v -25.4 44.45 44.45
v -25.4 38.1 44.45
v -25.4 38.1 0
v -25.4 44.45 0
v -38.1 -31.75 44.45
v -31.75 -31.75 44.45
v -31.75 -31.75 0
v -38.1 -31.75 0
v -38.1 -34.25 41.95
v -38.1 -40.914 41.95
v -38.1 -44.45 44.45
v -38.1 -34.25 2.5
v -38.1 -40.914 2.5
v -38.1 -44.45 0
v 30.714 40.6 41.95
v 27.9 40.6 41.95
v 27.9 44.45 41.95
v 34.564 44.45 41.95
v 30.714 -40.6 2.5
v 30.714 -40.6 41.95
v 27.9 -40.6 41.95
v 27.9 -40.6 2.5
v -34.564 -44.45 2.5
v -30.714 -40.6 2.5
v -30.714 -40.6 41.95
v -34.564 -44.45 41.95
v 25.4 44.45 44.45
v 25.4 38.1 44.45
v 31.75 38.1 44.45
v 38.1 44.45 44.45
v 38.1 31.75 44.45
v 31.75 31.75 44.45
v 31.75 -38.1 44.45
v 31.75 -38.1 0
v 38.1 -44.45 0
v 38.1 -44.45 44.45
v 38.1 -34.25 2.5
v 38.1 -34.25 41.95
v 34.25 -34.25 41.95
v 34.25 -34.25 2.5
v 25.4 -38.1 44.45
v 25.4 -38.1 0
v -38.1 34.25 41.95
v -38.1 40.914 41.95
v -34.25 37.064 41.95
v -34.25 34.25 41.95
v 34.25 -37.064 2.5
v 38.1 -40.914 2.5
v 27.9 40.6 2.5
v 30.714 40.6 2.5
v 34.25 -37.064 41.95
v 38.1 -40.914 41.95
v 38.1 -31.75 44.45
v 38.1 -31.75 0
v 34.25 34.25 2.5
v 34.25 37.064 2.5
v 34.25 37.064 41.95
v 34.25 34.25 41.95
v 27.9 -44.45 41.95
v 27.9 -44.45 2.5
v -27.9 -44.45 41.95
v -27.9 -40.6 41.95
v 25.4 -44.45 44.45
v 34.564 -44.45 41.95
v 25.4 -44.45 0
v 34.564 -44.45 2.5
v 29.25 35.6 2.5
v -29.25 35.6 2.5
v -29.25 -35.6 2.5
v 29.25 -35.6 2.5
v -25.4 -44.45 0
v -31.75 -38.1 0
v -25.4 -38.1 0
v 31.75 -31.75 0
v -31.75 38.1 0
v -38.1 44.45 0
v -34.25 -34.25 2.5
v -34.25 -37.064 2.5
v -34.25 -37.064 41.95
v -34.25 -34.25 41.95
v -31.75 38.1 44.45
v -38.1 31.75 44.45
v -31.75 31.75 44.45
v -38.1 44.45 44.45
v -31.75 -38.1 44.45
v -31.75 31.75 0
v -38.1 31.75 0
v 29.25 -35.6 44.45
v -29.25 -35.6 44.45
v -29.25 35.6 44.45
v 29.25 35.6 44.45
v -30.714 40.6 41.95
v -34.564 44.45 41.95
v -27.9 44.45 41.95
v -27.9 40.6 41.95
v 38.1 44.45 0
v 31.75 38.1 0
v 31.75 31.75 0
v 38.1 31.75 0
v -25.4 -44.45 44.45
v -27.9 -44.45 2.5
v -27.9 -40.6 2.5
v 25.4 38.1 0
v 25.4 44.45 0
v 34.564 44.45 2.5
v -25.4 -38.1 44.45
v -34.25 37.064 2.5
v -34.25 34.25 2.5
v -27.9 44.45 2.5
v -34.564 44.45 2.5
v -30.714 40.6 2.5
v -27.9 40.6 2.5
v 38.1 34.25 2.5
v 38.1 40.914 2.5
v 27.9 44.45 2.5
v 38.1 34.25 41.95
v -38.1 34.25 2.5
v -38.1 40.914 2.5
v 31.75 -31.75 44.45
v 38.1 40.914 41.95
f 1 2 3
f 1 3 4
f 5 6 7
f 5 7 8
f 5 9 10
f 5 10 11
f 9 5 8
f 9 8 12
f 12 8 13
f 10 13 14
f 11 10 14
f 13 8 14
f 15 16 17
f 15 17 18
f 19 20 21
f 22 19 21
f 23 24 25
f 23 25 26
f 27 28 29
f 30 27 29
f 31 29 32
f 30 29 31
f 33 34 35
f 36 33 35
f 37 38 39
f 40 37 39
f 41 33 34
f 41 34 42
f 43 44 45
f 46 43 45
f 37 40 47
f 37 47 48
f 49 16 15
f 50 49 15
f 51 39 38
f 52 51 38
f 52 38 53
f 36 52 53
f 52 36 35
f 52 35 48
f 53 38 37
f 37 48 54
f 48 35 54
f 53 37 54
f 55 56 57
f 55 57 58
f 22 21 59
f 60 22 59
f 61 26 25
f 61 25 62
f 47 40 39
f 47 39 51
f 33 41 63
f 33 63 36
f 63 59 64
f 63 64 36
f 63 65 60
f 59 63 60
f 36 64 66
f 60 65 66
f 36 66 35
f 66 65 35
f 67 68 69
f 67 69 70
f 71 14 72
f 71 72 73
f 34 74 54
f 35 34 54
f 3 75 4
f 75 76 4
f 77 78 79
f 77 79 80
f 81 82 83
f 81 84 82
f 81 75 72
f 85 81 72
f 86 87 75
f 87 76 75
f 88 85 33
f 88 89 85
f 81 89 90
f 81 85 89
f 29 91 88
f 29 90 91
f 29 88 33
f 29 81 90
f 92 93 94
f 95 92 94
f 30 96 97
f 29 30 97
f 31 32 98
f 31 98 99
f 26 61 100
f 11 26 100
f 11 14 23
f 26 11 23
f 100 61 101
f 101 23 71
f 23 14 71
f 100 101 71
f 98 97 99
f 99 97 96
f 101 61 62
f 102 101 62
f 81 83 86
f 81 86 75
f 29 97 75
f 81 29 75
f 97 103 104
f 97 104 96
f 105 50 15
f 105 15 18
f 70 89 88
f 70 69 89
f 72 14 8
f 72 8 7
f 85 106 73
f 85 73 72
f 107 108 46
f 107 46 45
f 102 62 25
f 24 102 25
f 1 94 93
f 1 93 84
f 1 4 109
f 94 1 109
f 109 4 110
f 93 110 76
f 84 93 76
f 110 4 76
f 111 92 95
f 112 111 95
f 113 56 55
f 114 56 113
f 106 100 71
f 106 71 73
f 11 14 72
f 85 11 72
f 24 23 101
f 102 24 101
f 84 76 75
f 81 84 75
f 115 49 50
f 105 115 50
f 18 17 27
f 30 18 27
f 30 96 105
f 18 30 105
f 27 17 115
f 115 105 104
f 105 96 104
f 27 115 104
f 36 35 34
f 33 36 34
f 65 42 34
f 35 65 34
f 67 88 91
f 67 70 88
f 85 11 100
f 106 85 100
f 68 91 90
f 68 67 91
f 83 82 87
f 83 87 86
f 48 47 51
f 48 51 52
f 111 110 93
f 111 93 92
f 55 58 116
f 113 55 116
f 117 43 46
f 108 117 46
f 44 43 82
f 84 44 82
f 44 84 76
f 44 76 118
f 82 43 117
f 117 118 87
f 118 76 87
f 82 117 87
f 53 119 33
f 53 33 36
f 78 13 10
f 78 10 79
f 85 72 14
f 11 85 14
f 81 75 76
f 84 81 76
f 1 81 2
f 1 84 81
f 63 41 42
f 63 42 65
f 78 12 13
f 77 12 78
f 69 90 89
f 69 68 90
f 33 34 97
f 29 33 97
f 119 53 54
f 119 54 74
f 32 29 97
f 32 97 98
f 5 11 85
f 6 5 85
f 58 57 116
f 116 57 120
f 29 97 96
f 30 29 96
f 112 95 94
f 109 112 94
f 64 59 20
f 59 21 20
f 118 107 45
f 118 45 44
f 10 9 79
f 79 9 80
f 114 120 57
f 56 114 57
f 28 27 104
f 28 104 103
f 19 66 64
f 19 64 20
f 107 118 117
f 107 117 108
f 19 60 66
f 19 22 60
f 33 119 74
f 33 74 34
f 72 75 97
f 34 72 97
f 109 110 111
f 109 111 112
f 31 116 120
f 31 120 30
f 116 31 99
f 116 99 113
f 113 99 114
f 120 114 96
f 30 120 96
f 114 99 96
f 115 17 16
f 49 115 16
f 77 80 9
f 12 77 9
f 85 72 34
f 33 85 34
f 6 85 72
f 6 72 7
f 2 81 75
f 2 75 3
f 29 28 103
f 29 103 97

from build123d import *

# Parameters (mm, degrees)
F1_DEPTH = 44.45
F2_T     = -2.5
F3_DEPTH = 44.45
F4_DEPTH = 44.45
F5_T     = -2.5
F5_2_T   = -2.5
F6_T     = -2.5
F6_2_T   = -2.5
F6_3_T   = -2.5
F6_4_T   = -2.5
F6_5_T   = -2.5
F6_6_T   = -2.5


with BuildPart() as f1:
    # F0 (on Top) → F1 (new body)
    with BuildSketch(Plane.XY):
        Polygon((25.4, -38.1), (31.75, -38.1), (31.75, -31.75), (31.75, 31.75), (31.75, 38.1), (25.4, 38.1), (-25.4, 38.1), (-31.75, 38.1), (-31.75, 31.75), (-31.75, -31.75), (-31.75, -38.1), (-25.4, -38.1), align=None)
    extrude(amount=F1_DEPTH)

    # F2
    f2_openings = [f1.faces().sort_by_distance(p)[0] for p in [
        (0, 0, 44.45),
    ]]
    offset(amount=F2_T, openings=f2_openings)


with BuildPart() as f3:
    # F0 (on Top) → F3 (new body)
    with BuildSketch(Plane.XY):
        Polygon((25.4, 38.1), (31.75, 38.1), (38.1, 44.45), (25.4, 44.45), align=None)
    extrude(amount=F3_DEPTH)

    # F6
    f6_openings = [f3.faces().sort_by_distance(p)[0] for p in [
        (31.75, 44.45, 22.225),
    ]]
    offset(amount=F6_T, openings=f6_openings)


with BuildPart() as f3b:
    # F0 (on Top) → F3, piece 2 (new body)
    with BuildSketch(Plane.XY):
        Polygon((31.75, -31.75), (31.75, -38.1), (38.1, -44.45), (38.1, -31.75), align=None)
    extrude(amount=F3_DEPTH)

    # F5
    f5_openings = [f3b.faces().sort_by_distance(p)[0] for p in [
        (38.1, -38.1, 22.225),
    ]]
    offset(amount=F5_T, openings=f5_openings)


with BuildPart() as f3c:
    # F0 (on Top) → F3, piece 3 (new body)
    with BuildSketch(Plane.XY):
        Polygon((-38.1, -44.45), (-31.75, -38.1), (-31.75, -31.75), (-38.1, -31.75), align=None)
    extrude(amount=F3_DEPTH)

    # F6#6
    f6_6_openings = [f3c.faces().sort_by_distance(p)[0] for p in [
        (-38.1, -38.1, 22.225),
    ]]
    offset(amount=F6_6_T, openings=f6_6_openings)


with BuildPart() as f3d:
    # F0 (on Top) → F3, piece 4 (new body)
    with BuildSketch(Plane.XY):
        Polygon((-31.75, 38.1), (-25.4, 38.1), (-25.4, 44.45), (-38.1, 44.45), align=None)
    extrude(amount=F3_DEPTH)

    # F6#4
    f6_4_openings = [f3d.faces().sort_by_distance(p)[0] for p in [
        (-31.75, 44.45, 22.225),
    ]]
    offset(amount=F6_4_T, openings=f6_4_openings)


with BuildPart() as f4:
    # F0 (on Top) → F4 (new body)
    with BuildSketch(Plane.XY):
        Polygon((-38.1, 31.75), (-31.75, 31.75), (-31.75, 38.1), (-38.1, 44.45), align=None)
    extrude(amount=F4_DEPTH)

    # F6#3
    f6_3_openings = [f4.faces().sort_by_distance(p)[0] for p in [
        (-38.1, 38.1, 22.225),
    ]]
    offset(amount=F6_3_T, openings=f6_3_openings)


with BuildPart() as f4b:
    # F0 (on Top) → F4, piece 2 (new body)
    with BuildSketch(Plane.XY):
        Polygon((31.75, 38.1), (31.75, 31.75), (38.1, 31.75), (38.1, 44.45), align=None)
    extrude(amount=F4_DEPTH)

    # F6#2
    f6_2_openings = [f4b.faces().sort_by_distance(p)[0] for p in [
        (38.1, 38.1, 22.225),
    ]]
    offset(amount=F6_2_T, openings=f6_2_openings)


with BuildPart() as f4c:
    # F0 (on Top) → F4, piece 3 (new body)
    with BuildSketch(Plane.XY):
        Polygon((38.1, -44.45), (31.75, -38.1), (25.4, -38.1), (25.4, -44.45), align=None)
    extrude(amount=F4_DEPTH)

    # F5#2
    f5_2_openings = [f4c.faces().sort_by_distance(p)[0] for p in [
        (31.75, -44.45, 22.225),
    ]]
    offset(amount=F5_2_T, openings=f5_2_openings)


with BuildPart() as f4d:
    # F0 (on Top) → F4, piece 4 (new body)
    with BuildSketch(Plane.XY):
        Polygon((-25.4, -44.45), (-25.4, -38.1), (-31.75, -38.1), (-38.1, -44.45), align=None)
    extrude(amount=F4_DEPTH)

    # F6#5
    f6_5_openings = [f4d.faces().sort_by_distance(p)[0] for p in [
        (-31.75, -44.45, 22.225),
    ]]
    offset(amount=F6_5_T, openings=f6_5_openings)


solid = Compound([f1.part, f3.part, f3b.part, f3c.part, f3d.part, f4.part, f4b.part, f4c.part, f4d.part])
